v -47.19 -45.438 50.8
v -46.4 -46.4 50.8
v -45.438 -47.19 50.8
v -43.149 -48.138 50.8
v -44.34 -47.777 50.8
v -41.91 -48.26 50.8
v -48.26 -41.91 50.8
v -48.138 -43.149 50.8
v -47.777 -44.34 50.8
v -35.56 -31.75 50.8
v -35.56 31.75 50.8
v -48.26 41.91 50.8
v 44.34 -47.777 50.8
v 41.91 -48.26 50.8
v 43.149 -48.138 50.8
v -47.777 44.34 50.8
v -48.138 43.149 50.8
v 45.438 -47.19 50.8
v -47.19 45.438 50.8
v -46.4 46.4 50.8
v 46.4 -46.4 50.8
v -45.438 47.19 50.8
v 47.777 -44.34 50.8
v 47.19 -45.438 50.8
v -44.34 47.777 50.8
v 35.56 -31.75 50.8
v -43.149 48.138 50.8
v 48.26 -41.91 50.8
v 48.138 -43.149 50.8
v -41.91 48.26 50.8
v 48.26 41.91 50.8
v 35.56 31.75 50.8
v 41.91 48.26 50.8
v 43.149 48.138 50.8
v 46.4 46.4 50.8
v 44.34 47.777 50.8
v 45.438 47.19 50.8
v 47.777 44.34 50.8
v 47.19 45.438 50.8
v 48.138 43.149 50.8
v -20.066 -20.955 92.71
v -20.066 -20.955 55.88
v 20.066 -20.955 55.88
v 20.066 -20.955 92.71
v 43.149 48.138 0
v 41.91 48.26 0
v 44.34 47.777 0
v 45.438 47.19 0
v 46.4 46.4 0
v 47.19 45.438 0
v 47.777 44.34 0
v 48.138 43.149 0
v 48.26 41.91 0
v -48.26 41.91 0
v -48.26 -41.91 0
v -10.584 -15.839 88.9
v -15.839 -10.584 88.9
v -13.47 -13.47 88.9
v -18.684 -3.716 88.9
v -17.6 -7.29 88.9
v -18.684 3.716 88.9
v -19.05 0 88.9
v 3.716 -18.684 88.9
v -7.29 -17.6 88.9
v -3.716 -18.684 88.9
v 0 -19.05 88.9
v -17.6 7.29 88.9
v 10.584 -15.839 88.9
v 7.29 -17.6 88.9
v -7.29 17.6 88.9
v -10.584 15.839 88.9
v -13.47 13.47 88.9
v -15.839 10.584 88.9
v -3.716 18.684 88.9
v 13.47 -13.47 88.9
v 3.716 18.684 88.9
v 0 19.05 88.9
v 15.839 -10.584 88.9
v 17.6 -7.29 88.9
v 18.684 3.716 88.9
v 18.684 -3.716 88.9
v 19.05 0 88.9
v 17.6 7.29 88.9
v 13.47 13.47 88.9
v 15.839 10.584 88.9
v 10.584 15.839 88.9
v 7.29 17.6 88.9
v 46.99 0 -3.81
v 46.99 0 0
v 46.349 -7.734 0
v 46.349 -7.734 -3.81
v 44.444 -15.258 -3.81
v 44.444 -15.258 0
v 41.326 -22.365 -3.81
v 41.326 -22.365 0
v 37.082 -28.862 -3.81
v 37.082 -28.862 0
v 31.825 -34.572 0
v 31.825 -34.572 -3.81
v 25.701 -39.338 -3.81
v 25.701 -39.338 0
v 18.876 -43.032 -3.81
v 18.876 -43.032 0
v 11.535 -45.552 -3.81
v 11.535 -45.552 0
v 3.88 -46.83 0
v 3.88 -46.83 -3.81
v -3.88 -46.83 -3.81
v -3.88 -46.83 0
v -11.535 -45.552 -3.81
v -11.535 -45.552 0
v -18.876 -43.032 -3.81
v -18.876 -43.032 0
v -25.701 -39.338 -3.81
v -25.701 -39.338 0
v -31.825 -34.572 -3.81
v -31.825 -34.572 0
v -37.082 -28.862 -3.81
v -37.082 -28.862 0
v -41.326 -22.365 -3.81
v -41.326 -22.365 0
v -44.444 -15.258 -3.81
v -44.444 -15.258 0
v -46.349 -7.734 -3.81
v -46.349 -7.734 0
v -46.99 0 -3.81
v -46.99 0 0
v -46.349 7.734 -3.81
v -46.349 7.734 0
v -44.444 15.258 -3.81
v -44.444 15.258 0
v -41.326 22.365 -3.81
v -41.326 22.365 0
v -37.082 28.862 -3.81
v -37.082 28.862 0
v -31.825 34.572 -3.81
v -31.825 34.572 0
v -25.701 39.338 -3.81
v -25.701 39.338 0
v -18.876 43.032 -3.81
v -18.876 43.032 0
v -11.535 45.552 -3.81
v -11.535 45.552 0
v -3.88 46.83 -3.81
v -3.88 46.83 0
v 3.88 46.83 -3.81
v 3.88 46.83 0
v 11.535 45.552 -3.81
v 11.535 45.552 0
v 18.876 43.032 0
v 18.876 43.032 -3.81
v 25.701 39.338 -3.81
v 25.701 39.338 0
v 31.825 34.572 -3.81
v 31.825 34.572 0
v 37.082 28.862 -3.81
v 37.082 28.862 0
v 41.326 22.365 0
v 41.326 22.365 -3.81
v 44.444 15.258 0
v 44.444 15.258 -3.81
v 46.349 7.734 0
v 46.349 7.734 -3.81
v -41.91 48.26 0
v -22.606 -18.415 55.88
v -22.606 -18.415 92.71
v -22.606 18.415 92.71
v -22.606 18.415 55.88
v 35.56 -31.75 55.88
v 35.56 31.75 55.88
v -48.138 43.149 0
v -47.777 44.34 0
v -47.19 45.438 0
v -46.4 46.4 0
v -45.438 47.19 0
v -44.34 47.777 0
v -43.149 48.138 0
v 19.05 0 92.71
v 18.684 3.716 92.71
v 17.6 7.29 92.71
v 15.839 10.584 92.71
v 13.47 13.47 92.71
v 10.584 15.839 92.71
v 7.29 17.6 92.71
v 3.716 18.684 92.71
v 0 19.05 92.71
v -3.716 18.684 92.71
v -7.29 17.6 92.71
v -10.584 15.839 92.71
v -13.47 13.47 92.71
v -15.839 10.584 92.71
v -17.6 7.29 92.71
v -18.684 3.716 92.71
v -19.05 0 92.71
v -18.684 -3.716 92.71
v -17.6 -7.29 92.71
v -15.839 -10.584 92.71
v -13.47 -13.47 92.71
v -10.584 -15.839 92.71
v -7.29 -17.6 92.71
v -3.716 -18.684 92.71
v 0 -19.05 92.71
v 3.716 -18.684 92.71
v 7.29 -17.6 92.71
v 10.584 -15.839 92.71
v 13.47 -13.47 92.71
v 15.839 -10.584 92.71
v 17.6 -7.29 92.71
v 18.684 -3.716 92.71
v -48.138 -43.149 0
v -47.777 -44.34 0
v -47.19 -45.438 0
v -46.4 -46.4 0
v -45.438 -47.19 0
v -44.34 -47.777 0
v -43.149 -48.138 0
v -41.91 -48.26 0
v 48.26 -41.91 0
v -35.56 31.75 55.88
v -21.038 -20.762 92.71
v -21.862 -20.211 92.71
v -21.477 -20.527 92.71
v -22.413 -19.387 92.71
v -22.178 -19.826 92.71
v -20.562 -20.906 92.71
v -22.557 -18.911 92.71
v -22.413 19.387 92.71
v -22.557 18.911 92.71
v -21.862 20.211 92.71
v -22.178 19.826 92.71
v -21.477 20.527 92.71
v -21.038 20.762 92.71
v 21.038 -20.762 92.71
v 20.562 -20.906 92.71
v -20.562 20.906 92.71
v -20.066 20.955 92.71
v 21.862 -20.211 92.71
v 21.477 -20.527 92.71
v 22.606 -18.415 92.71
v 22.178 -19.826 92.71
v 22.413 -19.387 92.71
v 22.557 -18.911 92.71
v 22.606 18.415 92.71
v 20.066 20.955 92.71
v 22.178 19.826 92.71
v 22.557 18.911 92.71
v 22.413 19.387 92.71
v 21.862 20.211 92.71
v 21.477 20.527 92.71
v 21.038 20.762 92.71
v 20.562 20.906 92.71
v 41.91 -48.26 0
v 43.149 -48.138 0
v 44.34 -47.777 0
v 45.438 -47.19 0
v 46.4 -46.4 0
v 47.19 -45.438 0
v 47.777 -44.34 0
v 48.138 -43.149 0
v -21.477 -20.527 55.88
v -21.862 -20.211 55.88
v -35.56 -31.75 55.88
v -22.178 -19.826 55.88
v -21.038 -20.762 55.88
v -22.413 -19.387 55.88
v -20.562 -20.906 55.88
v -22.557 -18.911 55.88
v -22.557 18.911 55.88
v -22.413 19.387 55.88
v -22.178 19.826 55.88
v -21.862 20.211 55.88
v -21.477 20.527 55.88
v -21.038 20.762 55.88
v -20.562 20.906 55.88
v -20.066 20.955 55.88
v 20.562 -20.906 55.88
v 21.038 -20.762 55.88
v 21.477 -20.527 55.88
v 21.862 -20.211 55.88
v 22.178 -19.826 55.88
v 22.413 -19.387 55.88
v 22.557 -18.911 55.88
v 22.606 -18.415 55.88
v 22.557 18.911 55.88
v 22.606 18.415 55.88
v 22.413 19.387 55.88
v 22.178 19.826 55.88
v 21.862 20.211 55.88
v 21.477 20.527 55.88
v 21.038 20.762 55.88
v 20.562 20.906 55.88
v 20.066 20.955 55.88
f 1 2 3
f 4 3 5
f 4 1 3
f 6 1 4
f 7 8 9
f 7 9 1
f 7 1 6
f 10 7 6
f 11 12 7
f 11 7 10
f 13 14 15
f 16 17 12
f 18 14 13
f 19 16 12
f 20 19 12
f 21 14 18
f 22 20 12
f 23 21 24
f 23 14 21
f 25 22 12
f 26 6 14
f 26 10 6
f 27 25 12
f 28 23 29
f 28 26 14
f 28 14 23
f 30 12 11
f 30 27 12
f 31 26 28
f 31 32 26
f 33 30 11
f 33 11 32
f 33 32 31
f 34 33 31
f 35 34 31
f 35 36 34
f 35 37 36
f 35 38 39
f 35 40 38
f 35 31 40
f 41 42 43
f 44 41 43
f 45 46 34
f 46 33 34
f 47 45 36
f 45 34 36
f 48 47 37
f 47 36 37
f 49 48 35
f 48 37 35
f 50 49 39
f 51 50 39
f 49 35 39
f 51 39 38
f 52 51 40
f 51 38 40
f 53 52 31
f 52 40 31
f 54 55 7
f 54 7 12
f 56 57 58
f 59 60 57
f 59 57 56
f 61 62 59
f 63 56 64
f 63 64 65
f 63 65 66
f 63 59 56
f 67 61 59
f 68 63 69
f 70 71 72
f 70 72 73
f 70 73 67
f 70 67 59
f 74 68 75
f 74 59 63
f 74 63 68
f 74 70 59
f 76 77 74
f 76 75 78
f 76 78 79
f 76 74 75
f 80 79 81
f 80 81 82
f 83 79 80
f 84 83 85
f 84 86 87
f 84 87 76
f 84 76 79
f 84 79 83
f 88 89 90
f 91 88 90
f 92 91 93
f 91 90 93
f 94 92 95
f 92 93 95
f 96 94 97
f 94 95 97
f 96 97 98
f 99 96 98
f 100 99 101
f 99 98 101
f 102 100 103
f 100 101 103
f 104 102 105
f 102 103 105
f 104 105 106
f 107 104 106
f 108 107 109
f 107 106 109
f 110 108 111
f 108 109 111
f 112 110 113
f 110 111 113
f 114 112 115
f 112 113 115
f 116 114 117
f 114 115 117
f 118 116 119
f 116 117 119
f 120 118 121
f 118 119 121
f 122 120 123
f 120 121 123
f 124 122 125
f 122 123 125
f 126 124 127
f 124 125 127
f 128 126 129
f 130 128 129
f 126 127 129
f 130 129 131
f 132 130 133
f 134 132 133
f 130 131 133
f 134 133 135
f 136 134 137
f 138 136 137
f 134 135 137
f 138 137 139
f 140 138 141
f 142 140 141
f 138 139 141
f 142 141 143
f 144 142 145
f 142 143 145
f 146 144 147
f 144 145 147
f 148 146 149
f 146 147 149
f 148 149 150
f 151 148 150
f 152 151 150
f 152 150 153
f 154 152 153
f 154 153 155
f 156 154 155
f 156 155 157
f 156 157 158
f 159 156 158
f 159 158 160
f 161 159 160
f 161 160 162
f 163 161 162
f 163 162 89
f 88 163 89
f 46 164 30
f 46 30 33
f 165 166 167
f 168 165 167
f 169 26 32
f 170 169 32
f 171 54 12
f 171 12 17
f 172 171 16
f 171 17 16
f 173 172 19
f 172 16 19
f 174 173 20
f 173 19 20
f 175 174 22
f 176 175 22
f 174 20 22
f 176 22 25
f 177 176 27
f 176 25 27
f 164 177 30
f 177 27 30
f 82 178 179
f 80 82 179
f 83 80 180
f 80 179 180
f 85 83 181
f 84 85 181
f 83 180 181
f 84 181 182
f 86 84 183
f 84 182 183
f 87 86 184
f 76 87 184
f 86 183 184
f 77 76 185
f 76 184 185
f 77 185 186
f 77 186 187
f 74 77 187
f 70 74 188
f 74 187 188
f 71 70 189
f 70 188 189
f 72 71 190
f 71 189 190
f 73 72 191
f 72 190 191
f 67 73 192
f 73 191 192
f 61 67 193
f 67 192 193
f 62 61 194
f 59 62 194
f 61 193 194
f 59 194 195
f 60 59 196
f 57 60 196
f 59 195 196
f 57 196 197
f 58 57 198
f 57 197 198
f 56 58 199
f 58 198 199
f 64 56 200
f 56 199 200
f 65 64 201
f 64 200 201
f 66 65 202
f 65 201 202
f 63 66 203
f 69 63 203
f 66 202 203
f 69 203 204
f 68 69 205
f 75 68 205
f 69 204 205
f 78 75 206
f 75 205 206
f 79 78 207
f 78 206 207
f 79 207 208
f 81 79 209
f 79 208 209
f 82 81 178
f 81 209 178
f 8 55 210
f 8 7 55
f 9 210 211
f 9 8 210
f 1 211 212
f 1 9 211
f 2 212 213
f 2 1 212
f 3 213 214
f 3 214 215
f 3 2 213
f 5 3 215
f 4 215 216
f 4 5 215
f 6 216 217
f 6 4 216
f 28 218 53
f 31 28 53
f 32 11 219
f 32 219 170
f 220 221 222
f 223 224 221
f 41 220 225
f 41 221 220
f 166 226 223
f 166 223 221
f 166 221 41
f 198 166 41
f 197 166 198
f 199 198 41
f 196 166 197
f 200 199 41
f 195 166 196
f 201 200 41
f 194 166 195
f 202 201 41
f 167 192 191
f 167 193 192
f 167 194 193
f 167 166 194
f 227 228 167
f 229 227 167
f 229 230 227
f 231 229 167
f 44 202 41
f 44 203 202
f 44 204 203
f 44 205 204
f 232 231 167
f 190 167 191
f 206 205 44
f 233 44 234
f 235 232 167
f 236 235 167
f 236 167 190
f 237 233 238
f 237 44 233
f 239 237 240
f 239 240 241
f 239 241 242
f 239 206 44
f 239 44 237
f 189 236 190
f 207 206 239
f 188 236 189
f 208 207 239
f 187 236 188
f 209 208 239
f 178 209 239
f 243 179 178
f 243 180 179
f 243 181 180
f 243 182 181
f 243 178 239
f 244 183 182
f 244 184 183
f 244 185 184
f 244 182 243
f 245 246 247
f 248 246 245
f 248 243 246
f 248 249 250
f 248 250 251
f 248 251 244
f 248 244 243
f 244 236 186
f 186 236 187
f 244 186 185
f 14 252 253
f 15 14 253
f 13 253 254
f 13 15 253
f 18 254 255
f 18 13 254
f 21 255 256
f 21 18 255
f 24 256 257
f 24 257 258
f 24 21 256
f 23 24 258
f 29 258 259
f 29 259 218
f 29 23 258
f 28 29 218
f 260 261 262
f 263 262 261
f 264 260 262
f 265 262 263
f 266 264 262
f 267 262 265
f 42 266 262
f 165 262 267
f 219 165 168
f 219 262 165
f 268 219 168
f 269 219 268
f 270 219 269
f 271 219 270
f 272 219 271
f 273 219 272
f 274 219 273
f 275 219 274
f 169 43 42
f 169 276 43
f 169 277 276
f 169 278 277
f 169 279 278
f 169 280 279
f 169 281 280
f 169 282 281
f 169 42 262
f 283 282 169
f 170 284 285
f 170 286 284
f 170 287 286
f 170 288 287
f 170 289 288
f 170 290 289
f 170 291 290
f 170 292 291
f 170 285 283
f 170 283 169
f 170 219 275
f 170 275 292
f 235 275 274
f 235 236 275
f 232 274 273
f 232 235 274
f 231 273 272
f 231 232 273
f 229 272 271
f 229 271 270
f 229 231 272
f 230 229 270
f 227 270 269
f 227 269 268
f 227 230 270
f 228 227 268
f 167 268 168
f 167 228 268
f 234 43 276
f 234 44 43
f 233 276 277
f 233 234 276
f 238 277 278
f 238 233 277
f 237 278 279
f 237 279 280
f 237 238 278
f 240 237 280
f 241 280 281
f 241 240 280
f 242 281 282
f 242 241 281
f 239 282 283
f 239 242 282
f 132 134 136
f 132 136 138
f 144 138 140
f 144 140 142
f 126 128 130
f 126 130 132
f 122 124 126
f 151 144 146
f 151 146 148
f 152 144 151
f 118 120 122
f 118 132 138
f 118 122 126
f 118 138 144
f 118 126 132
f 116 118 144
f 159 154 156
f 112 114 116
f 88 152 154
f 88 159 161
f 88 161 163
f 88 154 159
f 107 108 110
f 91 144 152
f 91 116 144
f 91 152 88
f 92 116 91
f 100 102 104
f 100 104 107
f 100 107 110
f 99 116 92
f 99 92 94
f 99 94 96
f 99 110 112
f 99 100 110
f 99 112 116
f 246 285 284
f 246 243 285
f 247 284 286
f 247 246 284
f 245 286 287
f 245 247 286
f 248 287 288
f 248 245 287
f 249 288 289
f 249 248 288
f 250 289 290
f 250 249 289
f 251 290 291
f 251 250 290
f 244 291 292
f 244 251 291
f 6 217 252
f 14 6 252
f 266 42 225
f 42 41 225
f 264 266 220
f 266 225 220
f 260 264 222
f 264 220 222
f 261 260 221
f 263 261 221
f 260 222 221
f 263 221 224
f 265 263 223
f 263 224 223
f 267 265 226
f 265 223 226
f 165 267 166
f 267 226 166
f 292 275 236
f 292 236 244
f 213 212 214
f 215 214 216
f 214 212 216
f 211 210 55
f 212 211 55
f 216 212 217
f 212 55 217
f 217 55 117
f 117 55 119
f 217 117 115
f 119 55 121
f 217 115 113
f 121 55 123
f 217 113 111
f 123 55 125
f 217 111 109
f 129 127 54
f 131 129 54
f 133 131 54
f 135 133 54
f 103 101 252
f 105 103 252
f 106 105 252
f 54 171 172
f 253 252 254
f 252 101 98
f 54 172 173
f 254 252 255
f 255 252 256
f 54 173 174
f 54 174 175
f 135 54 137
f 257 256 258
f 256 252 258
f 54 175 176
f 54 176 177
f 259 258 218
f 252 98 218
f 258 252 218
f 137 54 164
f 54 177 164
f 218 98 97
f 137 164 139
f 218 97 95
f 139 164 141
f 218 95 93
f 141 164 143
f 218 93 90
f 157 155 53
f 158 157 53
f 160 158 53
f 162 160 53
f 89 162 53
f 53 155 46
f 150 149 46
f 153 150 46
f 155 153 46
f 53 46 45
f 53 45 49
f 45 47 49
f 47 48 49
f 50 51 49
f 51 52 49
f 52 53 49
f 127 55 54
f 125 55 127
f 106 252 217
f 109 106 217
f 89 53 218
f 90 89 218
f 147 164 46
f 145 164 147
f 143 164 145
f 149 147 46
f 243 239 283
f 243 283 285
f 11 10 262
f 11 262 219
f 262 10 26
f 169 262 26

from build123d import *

# Parameters (mm, degrees)
SKETCH1_W           = 96.52
SKETCH1_H           = 96.52
BOSS_EXTRUDE1_DEPTH = 50.8
SKETCH2_W           = 71.12
SKETCH2_H           = 63.5
BOSS_EXTRUDE2_DEPTH = 5.08
SKETCH3_W           = 45.212
SKETCH3_H           = 41.91
BOSS_EXTRUDE3_DEPTH = 36.83
SKETCH4_R           = 19.05
CUT_EXTRUDE1_DEPTH  = 3.81
SKETCH5_R           = 46.99
BOSS_EXTRUDE4_DEPTH = 3.81
FILLET1_R           = 2.54
FILLET2_R           = 6.35


with BuildPart() as part:
    # Sketch1 → Boss-Extrude1 (new body)
    with BuildSketch(Plane.XY):
        Rectangle(SKETCH1_W, SKETCH1_H)
    extrude(amount=BOSS_EXTRUDE1_DEPTH)

    # Sketch2 → Boss-Extrude2 (add)
    with BuildSketch(Plane.XY.offset(50.8)):
        Rectangle(SKETCH2_W, SKETCH2_H)
    extrude(amount=BOSS_EXTRUDE2_DEPTH)

    # Sketch3 → Boss-Extrude3 (add)
    with BuildSketch(Plane.XY.offset(55.88)):
        Rectangle(SKETCH3_W, SKETCH3_H)
    extrude(amount=BOSS_EXTRUDE3_DEPTH)

    # Sketch4 → Cut-Extrude1 (cut)
    with BuildSketch(Plane.XY.offset(92.71)):
        Circle(SKETCH4_R)
    extrude(amount=-CUT_EXTRUDE1_DEPTH, mode=Mode.SUBTRACT)

    # Sketch5 → Boss-Extrude4 (add)
    with BuildSketch(Plane(origin=(0, 0, 0), x_dir=(-1, 0, 0), z_dir=(0, 0, -1))):
        with Locations(Location((0, 0, 0), (0, 0, 180))):
            Circle(SKETCH5_R)
    extrude(amount=BOSS_EXTRUDE4_DEPTH)

    # Fillet1
    fillet1_edges = [part.edges().sort_by_distance(p)[0] for p in [
        (22.606, -20.955, 74.295),
        (22.606, 20.955, 74.295),
        (-22.606, 20.955, 74.295),
        (-22.606, -20.955, 74.295),
    ]]
    fillet(fillet1_edges, radius=FILLET1_R)

    # Fillet2
    fillet2_edges = [part.edges().sort_by_distance(p)[0] for p in [
        (48.26, -48.26, 25.4),
        (-48.26, -48.26, 25.4),
        (-48.26, 48.26, 25.4),
        (48.26, 48.26, 25.4),
    ]]
    fillet(fillet2_edges, radius=FILLET2_R)


solid = part.part
